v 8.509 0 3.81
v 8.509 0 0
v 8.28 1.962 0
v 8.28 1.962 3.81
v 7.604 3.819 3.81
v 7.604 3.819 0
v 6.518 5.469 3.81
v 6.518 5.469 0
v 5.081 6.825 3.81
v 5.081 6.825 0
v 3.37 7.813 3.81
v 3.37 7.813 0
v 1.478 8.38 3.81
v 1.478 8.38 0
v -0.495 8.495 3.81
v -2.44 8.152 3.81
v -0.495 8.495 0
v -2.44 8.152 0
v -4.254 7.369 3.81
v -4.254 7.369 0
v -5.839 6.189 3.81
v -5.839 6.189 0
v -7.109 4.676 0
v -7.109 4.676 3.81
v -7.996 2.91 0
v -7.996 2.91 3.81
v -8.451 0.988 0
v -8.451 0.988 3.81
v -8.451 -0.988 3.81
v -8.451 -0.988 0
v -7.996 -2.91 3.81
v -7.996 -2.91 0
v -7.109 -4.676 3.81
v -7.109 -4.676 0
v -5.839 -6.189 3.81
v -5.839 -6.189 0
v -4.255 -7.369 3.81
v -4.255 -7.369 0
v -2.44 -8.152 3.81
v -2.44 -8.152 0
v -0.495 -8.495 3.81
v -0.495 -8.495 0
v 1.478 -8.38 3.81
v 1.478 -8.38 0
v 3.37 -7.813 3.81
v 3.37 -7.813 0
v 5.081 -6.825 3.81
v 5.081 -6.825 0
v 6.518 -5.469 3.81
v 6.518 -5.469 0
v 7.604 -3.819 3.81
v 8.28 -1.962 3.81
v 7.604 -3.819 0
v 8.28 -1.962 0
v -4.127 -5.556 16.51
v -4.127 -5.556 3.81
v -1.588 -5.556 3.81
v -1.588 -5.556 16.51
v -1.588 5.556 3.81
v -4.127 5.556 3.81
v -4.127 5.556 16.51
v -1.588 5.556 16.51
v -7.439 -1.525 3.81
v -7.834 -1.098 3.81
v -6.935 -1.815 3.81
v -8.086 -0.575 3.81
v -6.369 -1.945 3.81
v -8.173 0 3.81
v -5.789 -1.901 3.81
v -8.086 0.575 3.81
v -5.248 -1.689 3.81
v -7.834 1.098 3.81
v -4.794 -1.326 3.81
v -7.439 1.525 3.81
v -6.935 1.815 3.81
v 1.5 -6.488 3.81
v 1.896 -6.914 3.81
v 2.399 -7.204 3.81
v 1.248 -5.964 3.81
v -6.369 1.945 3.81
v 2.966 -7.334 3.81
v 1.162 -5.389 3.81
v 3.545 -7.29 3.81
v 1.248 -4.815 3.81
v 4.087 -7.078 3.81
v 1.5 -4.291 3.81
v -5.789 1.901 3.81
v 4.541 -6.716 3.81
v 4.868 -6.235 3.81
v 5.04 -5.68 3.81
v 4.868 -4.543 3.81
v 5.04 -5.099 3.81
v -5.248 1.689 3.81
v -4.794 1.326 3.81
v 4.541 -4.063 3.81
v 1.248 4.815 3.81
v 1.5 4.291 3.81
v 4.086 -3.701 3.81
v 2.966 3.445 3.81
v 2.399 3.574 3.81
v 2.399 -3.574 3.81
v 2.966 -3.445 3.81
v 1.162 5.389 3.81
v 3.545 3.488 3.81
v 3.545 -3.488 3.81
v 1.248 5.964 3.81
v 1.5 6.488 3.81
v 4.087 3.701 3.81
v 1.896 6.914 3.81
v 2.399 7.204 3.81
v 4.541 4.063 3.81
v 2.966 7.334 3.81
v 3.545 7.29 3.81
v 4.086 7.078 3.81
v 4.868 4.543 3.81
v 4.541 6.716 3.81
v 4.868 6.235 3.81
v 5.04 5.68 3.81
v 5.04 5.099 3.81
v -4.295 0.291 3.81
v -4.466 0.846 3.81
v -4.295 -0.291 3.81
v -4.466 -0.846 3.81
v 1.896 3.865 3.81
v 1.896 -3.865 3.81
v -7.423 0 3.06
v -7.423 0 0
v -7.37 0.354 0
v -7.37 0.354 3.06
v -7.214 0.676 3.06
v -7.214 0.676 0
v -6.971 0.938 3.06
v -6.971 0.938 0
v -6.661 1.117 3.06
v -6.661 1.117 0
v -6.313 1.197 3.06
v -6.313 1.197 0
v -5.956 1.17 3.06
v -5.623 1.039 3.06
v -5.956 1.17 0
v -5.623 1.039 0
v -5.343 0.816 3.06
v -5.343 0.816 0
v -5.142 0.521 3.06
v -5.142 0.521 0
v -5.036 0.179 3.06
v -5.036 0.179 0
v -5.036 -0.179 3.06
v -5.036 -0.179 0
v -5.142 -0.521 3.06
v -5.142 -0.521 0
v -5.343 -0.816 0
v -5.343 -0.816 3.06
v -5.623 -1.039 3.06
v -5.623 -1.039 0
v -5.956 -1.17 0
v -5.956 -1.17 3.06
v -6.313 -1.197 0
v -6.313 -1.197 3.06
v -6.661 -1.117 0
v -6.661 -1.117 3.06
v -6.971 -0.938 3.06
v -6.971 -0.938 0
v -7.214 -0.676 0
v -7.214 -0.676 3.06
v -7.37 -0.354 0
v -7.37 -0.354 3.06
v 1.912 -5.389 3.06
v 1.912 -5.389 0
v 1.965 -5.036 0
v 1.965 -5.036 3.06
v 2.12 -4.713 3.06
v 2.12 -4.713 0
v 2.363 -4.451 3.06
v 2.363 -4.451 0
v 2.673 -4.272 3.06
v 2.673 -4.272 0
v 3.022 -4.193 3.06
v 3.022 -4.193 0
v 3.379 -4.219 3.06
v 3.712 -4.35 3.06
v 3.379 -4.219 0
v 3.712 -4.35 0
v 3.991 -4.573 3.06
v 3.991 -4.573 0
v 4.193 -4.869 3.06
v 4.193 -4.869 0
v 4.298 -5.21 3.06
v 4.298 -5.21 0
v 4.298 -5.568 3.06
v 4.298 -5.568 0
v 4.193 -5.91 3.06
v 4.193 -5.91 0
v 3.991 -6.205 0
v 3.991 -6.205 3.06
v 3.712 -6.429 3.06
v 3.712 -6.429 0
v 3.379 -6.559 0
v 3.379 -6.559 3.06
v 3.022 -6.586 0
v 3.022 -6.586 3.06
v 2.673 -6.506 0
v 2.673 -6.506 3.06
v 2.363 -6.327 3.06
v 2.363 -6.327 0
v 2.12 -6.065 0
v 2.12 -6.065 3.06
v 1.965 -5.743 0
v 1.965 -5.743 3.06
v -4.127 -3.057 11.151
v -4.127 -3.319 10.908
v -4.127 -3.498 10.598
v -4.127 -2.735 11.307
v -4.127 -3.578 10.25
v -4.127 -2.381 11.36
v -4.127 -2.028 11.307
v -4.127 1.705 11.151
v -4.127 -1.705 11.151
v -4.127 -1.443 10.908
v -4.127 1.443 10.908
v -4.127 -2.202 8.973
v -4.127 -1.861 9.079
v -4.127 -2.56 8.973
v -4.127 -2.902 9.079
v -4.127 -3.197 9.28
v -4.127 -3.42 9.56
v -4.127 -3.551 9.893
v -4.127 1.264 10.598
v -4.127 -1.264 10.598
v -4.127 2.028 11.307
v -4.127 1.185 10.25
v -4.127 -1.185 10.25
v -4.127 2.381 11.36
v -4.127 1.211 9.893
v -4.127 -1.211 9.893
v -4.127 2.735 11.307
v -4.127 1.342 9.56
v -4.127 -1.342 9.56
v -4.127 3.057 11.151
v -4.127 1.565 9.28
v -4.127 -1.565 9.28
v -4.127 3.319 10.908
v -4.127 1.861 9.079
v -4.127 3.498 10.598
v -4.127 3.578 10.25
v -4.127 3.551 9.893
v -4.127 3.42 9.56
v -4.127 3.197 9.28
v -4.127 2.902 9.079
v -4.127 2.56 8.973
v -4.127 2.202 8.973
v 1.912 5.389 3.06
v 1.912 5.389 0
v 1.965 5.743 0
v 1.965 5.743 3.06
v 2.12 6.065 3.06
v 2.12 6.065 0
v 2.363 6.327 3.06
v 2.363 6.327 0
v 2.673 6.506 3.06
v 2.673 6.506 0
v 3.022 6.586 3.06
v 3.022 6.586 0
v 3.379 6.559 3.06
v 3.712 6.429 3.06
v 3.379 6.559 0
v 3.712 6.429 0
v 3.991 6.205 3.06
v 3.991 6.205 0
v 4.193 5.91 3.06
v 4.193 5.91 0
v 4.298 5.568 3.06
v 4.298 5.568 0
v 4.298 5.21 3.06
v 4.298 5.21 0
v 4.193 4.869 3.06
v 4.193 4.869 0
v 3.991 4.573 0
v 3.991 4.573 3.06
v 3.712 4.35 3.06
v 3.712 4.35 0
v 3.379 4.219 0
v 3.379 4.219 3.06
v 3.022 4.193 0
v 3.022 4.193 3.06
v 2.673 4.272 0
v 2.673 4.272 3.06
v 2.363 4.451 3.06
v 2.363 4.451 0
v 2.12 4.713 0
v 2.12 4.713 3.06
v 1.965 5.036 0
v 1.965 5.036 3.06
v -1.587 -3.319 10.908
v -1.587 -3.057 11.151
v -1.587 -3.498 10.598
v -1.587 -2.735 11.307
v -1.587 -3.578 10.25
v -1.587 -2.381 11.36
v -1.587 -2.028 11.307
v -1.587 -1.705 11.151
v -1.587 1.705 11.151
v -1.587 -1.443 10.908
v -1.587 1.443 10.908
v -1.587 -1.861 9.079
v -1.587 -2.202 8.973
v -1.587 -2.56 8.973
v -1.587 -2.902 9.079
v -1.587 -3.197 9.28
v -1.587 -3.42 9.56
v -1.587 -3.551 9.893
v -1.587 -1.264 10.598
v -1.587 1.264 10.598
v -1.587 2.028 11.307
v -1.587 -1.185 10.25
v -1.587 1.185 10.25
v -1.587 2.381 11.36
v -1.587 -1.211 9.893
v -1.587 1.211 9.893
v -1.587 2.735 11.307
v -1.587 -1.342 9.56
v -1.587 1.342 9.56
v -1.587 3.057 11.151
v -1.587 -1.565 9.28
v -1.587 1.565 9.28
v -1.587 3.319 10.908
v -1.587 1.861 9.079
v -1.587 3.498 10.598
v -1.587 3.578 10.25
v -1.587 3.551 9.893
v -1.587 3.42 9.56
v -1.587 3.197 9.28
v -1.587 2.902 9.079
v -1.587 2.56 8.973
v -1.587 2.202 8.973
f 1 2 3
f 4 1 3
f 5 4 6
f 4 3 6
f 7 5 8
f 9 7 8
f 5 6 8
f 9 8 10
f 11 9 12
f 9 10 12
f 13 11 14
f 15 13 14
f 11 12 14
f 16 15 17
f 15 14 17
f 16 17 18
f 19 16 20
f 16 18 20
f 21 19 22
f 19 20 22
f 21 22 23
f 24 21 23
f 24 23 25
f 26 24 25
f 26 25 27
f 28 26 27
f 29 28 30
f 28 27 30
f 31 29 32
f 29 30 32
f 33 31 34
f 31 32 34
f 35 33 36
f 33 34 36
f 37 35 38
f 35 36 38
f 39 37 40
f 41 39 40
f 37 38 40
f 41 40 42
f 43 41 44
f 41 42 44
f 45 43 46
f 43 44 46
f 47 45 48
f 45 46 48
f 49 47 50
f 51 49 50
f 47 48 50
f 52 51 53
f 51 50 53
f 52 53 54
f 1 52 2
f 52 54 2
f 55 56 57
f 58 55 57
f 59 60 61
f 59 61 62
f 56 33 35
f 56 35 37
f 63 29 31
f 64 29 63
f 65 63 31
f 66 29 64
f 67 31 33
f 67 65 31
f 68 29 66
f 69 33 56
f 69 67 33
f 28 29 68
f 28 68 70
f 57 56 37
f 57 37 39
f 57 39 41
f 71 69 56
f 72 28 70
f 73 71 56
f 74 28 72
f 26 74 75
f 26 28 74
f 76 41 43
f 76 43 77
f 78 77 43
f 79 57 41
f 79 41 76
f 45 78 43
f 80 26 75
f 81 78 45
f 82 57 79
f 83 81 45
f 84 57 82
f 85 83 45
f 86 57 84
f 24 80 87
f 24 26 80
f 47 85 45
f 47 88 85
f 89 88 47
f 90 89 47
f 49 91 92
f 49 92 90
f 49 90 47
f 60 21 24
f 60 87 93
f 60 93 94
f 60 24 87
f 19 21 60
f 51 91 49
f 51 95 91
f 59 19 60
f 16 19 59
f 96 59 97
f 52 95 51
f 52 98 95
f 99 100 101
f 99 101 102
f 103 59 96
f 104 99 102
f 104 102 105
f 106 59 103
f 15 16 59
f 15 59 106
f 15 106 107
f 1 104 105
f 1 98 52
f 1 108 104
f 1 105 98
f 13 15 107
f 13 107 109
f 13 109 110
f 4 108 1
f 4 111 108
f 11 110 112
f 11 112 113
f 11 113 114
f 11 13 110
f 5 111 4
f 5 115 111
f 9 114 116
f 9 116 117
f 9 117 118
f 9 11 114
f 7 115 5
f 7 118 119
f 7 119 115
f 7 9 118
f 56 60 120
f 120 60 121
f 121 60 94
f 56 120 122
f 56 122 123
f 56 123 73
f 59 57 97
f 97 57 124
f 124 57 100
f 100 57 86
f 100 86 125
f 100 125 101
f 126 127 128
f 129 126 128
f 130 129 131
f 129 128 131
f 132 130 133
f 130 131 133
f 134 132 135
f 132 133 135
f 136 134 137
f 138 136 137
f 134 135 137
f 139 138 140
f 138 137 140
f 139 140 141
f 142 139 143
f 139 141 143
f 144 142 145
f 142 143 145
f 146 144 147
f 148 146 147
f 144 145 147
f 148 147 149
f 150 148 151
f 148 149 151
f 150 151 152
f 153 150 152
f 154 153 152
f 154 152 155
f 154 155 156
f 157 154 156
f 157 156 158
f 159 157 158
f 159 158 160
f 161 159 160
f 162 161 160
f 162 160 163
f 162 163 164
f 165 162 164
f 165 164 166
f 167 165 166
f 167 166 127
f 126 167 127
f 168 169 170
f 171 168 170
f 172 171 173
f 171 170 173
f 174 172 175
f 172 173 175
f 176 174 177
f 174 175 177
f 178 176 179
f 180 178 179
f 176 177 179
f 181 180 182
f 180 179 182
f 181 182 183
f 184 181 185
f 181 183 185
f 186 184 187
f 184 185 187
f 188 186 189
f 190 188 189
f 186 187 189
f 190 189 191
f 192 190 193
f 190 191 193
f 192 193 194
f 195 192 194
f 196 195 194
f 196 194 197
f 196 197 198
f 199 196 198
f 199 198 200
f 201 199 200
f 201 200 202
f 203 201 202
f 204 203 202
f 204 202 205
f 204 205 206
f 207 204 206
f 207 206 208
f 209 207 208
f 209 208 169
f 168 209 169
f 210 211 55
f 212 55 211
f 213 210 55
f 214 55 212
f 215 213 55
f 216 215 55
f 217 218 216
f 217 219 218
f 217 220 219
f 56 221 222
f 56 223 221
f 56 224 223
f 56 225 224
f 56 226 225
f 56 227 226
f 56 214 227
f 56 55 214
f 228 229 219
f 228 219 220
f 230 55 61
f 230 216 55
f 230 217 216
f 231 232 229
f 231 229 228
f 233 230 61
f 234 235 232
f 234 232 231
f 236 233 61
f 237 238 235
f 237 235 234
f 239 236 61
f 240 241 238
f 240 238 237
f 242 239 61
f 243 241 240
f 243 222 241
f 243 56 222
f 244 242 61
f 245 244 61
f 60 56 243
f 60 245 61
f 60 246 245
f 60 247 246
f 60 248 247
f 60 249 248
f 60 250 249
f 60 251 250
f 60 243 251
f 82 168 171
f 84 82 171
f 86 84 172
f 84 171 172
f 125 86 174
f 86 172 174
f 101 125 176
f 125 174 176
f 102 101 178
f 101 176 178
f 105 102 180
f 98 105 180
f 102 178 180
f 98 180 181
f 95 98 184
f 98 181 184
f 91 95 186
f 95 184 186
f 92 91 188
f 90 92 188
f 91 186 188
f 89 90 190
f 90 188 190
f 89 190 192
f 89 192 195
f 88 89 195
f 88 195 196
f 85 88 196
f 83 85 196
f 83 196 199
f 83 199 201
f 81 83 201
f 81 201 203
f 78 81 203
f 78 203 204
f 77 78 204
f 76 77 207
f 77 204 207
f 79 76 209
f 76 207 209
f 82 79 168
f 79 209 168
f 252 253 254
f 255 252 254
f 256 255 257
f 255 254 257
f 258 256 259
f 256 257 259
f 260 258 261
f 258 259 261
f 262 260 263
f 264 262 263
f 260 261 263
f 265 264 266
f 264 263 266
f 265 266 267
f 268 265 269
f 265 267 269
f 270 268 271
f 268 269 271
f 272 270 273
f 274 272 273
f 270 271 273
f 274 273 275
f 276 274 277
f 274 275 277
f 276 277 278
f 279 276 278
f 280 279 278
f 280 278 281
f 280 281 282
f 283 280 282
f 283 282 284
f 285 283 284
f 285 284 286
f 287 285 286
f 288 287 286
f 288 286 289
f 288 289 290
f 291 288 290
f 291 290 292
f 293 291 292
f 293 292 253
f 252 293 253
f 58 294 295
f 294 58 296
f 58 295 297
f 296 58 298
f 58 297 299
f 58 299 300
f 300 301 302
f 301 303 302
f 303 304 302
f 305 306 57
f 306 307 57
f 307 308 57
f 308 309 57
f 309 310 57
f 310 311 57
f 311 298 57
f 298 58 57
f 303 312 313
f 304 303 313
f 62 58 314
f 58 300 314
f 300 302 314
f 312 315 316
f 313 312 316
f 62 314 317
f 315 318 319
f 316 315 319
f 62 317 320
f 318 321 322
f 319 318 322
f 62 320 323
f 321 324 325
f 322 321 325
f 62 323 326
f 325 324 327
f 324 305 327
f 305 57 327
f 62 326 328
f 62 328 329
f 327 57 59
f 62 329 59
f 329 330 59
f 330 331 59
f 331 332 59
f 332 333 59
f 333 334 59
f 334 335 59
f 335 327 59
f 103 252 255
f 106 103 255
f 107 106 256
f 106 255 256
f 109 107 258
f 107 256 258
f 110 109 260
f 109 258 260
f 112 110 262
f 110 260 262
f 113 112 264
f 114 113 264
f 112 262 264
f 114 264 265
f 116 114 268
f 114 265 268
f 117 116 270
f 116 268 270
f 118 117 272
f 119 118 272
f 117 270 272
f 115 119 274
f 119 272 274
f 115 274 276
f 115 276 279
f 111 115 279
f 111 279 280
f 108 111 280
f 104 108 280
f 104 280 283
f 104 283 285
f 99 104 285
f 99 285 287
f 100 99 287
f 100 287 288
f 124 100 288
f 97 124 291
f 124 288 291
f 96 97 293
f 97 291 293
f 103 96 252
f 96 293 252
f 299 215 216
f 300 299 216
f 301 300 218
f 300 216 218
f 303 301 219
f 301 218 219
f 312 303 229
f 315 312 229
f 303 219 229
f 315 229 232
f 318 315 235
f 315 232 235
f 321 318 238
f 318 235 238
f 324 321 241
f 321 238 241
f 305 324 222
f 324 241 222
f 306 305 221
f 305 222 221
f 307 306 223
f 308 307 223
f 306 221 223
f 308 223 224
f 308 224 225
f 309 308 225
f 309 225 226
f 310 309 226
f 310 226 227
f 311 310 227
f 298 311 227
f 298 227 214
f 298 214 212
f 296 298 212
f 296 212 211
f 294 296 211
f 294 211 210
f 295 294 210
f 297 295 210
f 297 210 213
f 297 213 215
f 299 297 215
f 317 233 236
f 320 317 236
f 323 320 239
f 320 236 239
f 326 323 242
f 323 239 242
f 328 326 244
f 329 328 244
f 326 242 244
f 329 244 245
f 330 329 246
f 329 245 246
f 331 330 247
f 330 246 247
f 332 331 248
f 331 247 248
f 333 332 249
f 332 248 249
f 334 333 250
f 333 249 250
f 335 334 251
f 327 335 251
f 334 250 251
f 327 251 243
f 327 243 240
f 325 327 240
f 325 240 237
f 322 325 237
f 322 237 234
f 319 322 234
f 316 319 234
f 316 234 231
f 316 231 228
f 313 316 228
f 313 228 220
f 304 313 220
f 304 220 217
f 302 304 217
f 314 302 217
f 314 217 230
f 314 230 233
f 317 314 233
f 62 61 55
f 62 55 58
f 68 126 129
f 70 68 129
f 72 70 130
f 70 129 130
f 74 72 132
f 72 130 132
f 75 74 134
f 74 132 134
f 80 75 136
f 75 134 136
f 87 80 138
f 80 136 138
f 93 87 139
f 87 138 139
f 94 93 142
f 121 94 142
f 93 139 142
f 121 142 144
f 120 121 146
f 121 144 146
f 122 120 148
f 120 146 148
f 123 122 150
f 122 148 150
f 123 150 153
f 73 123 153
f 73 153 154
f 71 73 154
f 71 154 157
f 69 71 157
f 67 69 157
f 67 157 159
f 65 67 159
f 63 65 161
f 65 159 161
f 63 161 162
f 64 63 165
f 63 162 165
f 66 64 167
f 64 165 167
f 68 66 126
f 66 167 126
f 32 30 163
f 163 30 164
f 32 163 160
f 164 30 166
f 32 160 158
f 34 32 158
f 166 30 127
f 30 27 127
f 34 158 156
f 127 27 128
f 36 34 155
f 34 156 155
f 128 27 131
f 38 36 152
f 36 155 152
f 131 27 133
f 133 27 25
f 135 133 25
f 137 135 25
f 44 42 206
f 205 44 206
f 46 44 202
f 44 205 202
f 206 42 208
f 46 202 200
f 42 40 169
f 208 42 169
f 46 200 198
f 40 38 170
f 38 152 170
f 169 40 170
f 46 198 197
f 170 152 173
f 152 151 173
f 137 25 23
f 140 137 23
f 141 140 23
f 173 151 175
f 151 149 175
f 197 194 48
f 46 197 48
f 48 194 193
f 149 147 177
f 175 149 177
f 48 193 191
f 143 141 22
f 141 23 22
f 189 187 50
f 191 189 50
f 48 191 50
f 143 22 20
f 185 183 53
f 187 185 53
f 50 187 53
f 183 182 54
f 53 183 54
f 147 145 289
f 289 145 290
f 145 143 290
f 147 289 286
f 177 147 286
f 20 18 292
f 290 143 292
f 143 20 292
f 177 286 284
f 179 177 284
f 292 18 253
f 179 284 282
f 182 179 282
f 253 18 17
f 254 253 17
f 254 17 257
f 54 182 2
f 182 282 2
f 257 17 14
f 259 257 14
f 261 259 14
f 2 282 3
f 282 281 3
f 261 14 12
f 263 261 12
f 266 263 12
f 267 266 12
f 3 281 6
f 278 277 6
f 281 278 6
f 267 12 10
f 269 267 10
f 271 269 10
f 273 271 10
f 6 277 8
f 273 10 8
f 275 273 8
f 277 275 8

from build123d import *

# Parameters (mm, degrees)
SKETCH2_R            = 8.509
BOSS_EXTRUDE1_DEPTH  = 3.81
SKETCH4_W            = 2.54
SKETCH4_H            = 11.1125
BOSS_EXTRUDE2_DEPTH  = 12.7
M2_CLEARANCE_HOLE1_D = 2.4
M2_CLEARANCE_HOLE2_D = 2.4
CHAMFER1_SIZE        = 0.75
CHAMFER2_SIZE        = 0.75
CHAMFER3_SIZE        = 0.75


with BuildPart() as part:
    # Sketch2 → Boss-Extrude1 (new body)
    with BuildSketch(Plane.XY):
        Circle(SKETCH2_R)
    extrude(amount=BOSS_EXTRUDE1_DEPTH)

    # Sketch4 → Boss-Extrude2 (add)
    with BuildSketch(Plane.XY.offset(3.81)):
        with Locations((-2.8575, 0)):
            Rectangle(SKETCH4_W, SKETCH4_H)
    extrude(amount=BOSS_EXTRUDE2_DEPTH)

    # M2 Clearance Hole1 (through all)
    with Locations(Plane.XY.offset(3.81)):
        with Locations((-6.223, 0), (3.1115, 5.389276088), (3.1115, -5.389276088)):
            Hole(M2_CLEARANCE_HOLE1_D / 2)

    # M2 Clearance Hole2 (through all)
    with Locations(Plane(origin=(-1.5875, 0, 0), x_dir=(0, 0, -1), z_dir=(1, 0, 0))):
        with Locations((-10.16, -2.38125), (-10.16, 2.38125)):
            Hole(M2_CLEARANCE_HOLE2_D / 2)

    # Chamfer1
    chamfer1_edges = [part.edges().sort_by_distance(p)[0] for p in [
        (4.3115, -5.389276088, 3.81),
    ]]
    chamfer(chamfer1_edges, length=CHAMFER1_SIZE)

    # Chamfer2
    chamfer2_edges = [part.edges().sort_by_distance(p)[0] for p in [
        (4.3115, 5.389276088, 3.81),
    ]]
    chamfer(chamfer2_edges, length=CHAMFER2_SIZE)

    # Chamfer3
    chamfer3_edges = [part.edges().sort_by_distance(p)[0] for p in [
        (-5.023, 0, 3.81),
    ]]
    chamfer(chamfer3_edges, length=CHAMFER3_SIZE)


solid = part.part
